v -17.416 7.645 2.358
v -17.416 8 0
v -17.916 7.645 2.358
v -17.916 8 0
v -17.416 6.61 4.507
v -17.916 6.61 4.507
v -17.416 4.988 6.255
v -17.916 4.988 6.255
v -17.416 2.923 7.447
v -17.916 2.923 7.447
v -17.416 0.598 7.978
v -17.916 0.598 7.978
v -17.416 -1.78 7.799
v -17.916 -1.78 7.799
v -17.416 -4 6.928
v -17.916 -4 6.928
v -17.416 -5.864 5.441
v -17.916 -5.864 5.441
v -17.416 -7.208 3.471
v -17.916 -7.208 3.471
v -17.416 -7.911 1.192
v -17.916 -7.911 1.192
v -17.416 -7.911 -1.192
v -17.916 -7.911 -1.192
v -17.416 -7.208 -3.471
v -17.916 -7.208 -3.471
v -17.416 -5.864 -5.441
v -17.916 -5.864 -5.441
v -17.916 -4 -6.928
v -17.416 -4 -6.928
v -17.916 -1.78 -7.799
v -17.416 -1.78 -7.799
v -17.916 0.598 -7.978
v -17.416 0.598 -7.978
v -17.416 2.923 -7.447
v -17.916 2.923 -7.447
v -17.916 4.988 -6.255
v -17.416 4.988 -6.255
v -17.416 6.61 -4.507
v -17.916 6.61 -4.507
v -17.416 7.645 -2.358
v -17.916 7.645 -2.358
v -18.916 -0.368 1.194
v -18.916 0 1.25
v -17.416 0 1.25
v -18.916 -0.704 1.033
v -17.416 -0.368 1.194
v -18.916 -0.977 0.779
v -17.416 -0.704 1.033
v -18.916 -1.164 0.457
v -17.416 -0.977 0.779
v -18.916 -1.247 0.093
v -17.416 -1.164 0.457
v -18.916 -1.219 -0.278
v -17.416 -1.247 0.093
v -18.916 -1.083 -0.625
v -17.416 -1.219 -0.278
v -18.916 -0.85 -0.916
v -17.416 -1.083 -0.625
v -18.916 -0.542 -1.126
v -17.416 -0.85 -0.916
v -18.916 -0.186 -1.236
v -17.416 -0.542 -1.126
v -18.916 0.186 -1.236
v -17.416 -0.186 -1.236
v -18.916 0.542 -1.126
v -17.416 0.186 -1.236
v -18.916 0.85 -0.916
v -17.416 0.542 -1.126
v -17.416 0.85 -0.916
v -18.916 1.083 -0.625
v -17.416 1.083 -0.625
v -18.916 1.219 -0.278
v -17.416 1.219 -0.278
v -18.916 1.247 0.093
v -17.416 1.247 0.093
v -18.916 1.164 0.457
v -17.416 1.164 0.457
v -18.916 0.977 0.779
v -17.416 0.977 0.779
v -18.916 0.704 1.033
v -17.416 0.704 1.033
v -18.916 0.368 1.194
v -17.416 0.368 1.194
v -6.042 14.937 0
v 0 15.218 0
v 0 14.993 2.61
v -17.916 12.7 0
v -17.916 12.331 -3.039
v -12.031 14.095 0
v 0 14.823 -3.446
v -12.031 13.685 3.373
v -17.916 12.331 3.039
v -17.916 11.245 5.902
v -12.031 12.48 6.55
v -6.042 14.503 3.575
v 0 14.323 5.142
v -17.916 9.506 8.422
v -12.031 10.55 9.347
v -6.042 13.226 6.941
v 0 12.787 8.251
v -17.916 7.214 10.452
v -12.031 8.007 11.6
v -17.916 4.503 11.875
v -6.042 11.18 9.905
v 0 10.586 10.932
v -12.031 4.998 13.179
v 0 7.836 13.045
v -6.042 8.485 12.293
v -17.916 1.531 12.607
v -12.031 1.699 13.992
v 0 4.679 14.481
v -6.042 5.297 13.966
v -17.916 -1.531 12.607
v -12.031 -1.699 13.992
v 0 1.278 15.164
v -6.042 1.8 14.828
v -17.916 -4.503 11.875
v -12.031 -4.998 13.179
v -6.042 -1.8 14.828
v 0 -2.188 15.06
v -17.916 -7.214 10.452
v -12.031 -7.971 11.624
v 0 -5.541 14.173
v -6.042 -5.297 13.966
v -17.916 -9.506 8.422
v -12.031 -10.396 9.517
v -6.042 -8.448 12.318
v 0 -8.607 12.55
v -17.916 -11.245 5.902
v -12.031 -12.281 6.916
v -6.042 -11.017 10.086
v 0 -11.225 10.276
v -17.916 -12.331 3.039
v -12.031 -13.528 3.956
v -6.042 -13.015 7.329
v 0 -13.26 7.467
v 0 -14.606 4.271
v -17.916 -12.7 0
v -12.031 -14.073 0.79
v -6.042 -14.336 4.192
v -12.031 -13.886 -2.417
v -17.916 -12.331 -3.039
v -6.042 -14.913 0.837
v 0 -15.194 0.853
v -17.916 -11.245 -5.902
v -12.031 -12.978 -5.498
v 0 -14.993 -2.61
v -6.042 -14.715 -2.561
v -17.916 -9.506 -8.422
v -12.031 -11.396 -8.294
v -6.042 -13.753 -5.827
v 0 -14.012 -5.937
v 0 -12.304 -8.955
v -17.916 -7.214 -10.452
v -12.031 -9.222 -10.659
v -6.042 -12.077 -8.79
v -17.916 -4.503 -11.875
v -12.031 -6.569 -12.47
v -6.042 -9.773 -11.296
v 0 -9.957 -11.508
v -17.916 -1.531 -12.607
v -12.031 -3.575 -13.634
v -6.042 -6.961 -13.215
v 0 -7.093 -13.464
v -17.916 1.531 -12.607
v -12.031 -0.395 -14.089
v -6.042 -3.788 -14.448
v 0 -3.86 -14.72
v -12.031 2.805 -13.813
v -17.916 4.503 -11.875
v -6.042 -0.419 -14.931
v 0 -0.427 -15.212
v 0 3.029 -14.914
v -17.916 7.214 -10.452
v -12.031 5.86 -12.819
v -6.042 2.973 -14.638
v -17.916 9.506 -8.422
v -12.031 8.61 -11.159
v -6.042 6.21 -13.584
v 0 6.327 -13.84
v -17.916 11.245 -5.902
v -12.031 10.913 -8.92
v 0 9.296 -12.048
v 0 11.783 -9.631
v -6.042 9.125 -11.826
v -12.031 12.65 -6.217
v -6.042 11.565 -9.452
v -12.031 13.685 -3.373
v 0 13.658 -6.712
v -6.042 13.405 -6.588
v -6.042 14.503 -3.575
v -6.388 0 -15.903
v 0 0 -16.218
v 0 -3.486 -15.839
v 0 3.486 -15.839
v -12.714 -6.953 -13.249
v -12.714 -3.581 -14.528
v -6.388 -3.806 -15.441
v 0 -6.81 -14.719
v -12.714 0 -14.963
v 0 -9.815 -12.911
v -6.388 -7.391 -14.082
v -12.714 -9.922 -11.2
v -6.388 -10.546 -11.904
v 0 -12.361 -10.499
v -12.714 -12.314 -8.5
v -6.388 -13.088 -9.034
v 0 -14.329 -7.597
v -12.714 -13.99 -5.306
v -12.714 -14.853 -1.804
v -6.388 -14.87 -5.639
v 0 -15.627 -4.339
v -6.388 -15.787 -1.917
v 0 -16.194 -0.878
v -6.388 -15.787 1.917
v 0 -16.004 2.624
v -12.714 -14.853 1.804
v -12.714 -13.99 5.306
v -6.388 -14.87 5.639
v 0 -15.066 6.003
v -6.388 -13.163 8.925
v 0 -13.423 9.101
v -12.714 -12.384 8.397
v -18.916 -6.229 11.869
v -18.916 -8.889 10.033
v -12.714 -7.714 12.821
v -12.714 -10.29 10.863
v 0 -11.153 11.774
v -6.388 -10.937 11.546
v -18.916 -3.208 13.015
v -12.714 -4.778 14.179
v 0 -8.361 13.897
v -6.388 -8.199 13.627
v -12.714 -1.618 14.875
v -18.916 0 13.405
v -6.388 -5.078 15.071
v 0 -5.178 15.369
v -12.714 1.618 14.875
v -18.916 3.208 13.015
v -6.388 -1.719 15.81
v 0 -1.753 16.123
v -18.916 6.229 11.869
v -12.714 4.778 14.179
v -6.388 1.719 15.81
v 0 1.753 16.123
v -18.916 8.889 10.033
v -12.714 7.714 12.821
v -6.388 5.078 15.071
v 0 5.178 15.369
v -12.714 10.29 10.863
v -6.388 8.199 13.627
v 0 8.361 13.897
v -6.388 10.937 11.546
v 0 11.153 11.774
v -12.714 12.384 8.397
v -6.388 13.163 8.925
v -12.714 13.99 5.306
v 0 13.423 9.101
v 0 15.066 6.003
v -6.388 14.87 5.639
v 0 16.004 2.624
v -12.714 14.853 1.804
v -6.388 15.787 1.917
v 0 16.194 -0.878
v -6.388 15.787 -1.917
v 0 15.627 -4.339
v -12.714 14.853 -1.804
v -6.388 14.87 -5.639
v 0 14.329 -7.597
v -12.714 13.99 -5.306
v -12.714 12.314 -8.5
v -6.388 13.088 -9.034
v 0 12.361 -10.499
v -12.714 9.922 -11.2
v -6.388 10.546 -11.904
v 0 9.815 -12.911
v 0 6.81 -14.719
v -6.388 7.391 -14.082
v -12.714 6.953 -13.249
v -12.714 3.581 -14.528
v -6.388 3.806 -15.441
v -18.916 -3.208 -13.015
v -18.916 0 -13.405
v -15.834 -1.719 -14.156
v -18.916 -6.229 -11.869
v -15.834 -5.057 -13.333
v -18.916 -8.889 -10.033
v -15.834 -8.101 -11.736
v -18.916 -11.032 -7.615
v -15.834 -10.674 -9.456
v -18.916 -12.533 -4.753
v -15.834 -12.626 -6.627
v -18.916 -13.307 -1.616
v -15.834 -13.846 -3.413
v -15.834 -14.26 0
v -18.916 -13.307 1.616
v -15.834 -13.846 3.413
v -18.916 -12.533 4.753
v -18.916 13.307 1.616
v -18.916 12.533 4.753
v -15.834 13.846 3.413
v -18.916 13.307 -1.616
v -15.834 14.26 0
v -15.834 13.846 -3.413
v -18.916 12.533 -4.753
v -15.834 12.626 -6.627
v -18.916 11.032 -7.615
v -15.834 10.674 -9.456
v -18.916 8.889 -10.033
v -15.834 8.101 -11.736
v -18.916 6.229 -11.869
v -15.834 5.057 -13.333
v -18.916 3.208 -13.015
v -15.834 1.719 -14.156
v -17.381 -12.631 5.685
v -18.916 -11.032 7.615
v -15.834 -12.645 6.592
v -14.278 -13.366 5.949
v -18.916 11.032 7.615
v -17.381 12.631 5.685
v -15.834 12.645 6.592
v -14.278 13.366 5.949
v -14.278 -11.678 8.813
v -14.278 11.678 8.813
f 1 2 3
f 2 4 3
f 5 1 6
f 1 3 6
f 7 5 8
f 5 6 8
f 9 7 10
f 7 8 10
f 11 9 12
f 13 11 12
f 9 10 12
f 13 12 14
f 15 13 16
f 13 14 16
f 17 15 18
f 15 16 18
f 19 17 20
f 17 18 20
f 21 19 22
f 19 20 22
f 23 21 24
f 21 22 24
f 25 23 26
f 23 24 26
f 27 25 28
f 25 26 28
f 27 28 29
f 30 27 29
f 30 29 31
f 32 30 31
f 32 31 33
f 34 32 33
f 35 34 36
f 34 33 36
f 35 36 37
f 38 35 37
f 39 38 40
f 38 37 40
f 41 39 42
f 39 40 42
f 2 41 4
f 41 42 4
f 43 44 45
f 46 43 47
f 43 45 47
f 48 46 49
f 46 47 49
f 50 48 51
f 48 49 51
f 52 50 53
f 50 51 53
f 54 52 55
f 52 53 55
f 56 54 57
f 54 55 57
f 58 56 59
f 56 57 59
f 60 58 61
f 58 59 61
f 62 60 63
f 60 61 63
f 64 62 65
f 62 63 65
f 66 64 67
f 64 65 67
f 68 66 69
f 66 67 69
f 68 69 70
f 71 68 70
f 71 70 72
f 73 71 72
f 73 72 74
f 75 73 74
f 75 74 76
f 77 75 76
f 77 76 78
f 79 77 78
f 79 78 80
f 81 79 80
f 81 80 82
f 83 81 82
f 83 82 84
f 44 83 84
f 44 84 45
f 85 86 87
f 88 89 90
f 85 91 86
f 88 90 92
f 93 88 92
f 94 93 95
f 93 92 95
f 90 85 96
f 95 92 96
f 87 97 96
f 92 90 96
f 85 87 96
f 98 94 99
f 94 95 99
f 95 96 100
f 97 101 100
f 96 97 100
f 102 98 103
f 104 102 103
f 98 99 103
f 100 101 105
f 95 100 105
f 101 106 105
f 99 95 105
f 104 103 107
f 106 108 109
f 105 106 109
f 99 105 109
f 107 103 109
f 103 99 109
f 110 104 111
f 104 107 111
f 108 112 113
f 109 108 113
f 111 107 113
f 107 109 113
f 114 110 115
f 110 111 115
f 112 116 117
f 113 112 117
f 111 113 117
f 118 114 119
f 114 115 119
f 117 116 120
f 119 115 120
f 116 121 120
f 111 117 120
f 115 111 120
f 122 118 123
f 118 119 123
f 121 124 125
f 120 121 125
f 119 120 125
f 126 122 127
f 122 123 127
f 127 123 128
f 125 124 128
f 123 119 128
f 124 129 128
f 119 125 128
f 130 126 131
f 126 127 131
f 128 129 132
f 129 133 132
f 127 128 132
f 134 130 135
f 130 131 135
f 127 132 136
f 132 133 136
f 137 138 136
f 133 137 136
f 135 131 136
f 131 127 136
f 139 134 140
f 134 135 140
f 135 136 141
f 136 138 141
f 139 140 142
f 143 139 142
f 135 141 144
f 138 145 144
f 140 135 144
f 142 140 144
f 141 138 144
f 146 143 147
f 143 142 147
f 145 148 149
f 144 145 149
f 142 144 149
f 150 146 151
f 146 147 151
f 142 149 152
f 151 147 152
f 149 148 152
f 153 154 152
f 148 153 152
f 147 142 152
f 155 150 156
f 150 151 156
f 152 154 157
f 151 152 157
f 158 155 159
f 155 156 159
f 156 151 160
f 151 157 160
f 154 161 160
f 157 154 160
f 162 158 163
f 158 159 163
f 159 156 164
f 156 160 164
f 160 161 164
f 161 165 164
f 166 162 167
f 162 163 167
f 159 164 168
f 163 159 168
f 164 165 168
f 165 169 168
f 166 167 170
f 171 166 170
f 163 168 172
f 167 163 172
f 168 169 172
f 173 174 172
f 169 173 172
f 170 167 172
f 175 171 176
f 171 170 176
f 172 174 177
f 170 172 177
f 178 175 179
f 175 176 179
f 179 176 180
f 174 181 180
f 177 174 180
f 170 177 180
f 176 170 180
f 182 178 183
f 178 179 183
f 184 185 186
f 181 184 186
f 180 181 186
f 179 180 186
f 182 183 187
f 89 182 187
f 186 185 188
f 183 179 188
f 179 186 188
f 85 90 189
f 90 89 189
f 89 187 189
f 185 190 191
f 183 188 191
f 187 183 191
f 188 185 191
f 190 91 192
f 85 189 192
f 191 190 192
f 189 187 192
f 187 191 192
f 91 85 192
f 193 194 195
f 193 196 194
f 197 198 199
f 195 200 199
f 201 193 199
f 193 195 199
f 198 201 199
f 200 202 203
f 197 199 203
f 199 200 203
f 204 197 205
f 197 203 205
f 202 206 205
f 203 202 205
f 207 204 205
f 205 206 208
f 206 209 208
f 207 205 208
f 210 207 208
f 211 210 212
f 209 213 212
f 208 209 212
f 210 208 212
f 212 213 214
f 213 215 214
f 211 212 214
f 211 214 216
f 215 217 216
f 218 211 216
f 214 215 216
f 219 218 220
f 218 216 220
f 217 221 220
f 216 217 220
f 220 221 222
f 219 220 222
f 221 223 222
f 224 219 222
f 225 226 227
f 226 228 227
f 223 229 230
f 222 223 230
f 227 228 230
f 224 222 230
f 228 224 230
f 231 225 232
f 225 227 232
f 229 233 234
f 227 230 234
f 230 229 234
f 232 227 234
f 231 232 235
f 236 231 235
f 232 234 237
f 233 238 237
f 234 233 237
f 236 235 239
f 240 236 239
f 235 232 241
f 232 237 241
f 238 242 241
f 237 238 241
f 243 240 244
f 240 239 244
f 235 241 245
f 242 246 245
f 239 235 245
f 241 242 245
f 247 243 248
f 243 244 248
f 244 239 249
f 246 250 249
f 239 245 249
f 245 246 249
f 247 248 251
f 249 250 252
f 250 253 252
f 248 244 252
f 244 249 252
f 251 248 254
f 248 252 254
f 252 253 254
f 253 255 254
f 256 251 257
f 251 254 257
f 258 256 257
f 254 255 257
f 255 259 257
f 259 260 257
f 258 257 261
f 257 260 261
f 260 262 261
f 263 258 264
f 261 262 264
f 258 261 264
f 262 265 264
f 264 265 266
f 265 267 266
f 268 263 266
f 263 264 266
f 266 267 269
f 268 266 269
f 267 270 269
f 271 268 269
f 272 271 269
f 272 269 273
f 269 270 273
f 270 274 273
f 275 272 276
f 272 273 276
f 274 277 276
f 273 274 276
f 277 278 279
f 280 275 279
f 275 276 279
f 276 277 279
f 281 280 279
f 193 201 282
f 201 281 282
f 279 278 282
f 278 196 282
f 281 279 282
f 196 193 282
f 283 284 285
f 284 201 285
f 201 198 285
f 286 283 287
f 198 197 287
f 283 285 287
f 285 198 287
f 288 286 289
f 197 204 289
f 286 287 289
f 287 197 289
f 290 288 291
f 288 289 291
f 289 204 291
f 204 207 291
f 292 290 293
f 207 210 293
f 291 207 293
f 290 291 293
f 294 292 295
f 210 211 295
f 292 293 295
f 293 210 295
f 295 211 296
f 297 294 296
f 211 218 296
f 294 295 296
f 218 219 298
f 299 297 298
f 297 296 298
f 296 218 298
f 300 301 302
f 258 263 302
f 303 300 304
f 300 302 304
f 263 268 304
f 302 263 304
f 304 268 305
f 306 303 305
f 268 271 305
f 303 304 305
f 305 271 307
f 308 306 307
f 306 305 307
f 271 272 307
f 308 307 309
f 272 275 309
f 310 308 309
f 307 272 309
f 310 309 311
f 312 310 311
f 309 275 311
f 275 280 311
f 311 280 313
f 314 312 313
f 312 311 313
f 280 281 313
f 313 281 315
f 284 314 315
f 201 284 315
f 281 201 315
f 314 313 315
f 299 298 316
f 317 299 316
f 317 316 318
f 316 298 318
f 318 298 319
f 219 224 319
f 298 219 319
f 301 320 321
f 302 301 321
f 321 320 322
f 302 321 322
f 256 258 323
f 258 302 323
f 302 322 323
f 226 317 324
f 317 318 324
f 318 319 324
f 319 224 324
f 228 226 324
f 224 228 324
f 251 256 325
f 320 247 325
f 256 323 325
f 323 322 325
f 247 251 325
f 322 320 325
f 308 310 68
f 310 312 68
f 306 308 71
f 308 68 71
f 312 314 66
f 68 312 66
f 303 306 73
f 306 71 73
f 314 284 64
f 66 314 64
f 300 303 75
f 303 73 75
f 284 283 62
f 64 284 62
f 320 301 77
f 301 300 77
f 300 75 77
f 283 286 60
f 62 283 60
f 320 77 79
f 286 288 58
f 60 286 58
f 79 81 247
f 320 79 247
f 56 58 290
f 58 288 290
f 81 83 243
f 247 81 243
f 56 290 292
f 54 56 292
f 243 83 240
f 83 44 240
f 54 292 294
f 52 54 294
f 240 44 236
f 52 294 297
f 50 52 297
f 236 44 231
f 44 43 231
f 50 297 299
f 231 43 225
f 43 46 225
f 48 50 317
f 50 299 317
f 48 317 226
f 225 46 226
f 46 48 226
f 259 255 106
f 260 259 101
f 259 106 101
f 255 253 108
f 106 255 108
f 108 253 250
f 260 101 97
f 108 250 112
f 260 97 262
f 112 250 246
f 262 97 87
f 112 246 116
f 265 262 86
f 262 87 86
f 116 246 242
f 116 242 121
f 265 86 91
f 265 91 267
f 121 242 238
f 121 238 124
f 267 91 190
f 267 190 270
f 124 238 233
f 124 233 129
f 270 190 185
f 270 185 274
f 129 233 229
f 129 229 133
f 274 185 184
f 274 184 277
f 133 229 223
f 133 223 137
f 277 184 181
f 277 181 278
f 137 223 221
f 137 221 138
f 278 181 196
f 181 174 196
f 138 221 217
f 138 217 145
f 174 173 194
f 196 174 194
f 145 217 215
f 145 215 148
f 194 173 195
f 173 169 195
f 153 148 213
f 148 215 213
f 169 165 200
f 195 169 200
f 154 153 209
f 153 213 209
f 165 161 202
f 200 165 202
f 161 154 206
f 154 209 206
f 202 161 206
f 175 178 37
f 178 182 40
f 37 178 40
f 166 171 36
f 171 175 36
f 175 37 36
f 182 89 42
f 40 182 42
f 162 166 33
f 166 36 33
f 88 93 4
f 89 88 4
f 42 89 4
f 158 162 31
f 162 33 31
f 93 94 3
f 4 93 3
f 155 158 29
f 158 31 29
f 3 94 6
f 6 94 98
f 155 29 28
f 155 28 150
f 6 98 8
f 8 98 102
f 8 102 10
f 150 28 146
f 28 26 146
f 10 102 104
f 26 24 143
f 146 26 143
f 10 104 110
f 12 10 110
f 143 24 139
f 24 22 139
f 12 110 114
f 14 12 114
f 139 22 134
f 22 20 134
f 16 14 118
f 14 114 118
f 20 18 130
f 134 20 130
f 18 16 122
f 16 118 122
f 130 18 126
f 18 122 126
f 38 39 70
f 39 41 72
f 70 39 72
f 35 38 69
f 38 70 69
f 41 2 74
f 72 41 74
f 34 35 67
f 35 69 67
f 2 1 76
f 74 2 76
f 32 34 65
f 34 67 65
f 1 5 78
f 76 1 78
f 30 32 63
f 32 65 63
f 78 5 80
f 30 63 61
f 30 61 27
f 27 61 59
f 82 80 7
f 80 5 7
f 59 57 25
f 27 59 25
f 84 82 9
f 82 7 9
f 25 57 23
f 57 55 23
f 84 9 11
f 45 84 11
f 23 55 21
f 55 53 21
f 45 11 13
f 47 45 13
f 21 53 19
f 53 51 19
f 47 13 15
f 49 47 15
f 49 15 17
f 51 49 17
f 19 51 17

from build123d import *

# Parameters (mm, degrees)
CUT_EXTRUDE1_REACH = 31.73
SKETCH2_R          = 1.25


# Read off the part's stored shape, not the designer's step: Roller coating 12, Roller core 12 coated
with BuildPart() as part:
    # Roller coating 12 outline → Roller coating 12 (revolve)
    with BuildSketch(Plane.YX):
        with BuildLine():
            ThreePointArc((12.7, -17.916428128), (15.217989764, 0), (12.7, 17.916428128))
            Line((12.7, 17.916428128), (8, 17.916428128))
            Line((8, 17.916428128), (8, 17.416428128))
            Line((8, 17.416428128), (12.322080058, 17.416428128))
            ThreePointArc((12.322080058, 17.416428128), (14.717989764, 0), (12.322080058, -17.416428128))
            Line((12.322080058, -17.416428128), (8, -17.416428128))
            Line((8, -17.416428128), (8, -17.916428128))
            Line((8, -17.916428128), (12.7, -17.916428128))
        make_face()
    revolve(axis=Axis((0, 0, 0), (1, 0, 0)))


with BuildPart() as body_2:
    # Roller core 12 coated outline → Roller core 12 coated (revolve)
    with BuildSketch(Plane.YX):
        with BuildLine():
            Line((1.25, 17.416428128), (1.25, -17.416428128))
            Line((1.25, -17.416428128), (12.322080058, -17.416428128))
            ThreePointArc((12.322080058, -17.416428128), (14.717989764, 0), (12.322080058, 17.416428128))
            Line((12.322080058, 17.416428128), (1.25, 17.416428128))
        make_face()
    revolve(axis=Axis((0, 0, 0), (1, 0, 0)))


with BuildPart() as body_3:
    # Sketch1 → Revolve1 (revolve)
    with BuildSketch(Plane.XY, mode=Mode.PRIVATE) as revolve1_sk:
        with BuildLine():
            Line((0, 0), (-17.916428128, 0))
            Line((-17.916428128, 0), (-18.916428128, 0))
            Line((-18.916428128, 0), (-18.916428128, 13.404553802))
            ThreePointArc((-18.916428128, 13.404553802), (-9.562252285, 15.510783538), (0, 16.217989764))
            Line((0, 16.217989764), (0, 15.217989764))
            Line((0, 15.217989764), (0, 0))
        make_face()
    revolve(revolve1_sk.sketch.rotate(Axis((0, 0, 0), (-1, 0, 0)), 90), axis=Axis((0, 0, 0), (-1, 0, 0)))

    # Combine1: cut body 2
    add(body_2.part, mode=Mode.SUBTRACT)

    # Combine2: cut part
    add(part.part, mode=Mode.SUBTRACT)

    # Sketch2 → Cut-Extrude1 (cut, up to next)
    with BuildSketch(Plane(origin=(0, 0, 0), x_dir=(0, 0, -1), z_dir=(1, 0, 0)), mode=Mode.PRIVATE) as cut_extrude1_sk1:
        with Locations(Location((0, 0, 0), (0, 0, 180))):
            Circle(SKETCH2_R)
    cut_extrude1_tool1 = extrude(cut_extrude1_sk1.sketch, amount=-CUT_EXTRUDE1_REACH, mode=Mode.PRIVATE) & body_3.part
    add(cut_extrude1_tool1.solids().sort_by_distance((0, 0, 0))[0], mode=Mode.SUBTRACT)


solid = body_3.part
